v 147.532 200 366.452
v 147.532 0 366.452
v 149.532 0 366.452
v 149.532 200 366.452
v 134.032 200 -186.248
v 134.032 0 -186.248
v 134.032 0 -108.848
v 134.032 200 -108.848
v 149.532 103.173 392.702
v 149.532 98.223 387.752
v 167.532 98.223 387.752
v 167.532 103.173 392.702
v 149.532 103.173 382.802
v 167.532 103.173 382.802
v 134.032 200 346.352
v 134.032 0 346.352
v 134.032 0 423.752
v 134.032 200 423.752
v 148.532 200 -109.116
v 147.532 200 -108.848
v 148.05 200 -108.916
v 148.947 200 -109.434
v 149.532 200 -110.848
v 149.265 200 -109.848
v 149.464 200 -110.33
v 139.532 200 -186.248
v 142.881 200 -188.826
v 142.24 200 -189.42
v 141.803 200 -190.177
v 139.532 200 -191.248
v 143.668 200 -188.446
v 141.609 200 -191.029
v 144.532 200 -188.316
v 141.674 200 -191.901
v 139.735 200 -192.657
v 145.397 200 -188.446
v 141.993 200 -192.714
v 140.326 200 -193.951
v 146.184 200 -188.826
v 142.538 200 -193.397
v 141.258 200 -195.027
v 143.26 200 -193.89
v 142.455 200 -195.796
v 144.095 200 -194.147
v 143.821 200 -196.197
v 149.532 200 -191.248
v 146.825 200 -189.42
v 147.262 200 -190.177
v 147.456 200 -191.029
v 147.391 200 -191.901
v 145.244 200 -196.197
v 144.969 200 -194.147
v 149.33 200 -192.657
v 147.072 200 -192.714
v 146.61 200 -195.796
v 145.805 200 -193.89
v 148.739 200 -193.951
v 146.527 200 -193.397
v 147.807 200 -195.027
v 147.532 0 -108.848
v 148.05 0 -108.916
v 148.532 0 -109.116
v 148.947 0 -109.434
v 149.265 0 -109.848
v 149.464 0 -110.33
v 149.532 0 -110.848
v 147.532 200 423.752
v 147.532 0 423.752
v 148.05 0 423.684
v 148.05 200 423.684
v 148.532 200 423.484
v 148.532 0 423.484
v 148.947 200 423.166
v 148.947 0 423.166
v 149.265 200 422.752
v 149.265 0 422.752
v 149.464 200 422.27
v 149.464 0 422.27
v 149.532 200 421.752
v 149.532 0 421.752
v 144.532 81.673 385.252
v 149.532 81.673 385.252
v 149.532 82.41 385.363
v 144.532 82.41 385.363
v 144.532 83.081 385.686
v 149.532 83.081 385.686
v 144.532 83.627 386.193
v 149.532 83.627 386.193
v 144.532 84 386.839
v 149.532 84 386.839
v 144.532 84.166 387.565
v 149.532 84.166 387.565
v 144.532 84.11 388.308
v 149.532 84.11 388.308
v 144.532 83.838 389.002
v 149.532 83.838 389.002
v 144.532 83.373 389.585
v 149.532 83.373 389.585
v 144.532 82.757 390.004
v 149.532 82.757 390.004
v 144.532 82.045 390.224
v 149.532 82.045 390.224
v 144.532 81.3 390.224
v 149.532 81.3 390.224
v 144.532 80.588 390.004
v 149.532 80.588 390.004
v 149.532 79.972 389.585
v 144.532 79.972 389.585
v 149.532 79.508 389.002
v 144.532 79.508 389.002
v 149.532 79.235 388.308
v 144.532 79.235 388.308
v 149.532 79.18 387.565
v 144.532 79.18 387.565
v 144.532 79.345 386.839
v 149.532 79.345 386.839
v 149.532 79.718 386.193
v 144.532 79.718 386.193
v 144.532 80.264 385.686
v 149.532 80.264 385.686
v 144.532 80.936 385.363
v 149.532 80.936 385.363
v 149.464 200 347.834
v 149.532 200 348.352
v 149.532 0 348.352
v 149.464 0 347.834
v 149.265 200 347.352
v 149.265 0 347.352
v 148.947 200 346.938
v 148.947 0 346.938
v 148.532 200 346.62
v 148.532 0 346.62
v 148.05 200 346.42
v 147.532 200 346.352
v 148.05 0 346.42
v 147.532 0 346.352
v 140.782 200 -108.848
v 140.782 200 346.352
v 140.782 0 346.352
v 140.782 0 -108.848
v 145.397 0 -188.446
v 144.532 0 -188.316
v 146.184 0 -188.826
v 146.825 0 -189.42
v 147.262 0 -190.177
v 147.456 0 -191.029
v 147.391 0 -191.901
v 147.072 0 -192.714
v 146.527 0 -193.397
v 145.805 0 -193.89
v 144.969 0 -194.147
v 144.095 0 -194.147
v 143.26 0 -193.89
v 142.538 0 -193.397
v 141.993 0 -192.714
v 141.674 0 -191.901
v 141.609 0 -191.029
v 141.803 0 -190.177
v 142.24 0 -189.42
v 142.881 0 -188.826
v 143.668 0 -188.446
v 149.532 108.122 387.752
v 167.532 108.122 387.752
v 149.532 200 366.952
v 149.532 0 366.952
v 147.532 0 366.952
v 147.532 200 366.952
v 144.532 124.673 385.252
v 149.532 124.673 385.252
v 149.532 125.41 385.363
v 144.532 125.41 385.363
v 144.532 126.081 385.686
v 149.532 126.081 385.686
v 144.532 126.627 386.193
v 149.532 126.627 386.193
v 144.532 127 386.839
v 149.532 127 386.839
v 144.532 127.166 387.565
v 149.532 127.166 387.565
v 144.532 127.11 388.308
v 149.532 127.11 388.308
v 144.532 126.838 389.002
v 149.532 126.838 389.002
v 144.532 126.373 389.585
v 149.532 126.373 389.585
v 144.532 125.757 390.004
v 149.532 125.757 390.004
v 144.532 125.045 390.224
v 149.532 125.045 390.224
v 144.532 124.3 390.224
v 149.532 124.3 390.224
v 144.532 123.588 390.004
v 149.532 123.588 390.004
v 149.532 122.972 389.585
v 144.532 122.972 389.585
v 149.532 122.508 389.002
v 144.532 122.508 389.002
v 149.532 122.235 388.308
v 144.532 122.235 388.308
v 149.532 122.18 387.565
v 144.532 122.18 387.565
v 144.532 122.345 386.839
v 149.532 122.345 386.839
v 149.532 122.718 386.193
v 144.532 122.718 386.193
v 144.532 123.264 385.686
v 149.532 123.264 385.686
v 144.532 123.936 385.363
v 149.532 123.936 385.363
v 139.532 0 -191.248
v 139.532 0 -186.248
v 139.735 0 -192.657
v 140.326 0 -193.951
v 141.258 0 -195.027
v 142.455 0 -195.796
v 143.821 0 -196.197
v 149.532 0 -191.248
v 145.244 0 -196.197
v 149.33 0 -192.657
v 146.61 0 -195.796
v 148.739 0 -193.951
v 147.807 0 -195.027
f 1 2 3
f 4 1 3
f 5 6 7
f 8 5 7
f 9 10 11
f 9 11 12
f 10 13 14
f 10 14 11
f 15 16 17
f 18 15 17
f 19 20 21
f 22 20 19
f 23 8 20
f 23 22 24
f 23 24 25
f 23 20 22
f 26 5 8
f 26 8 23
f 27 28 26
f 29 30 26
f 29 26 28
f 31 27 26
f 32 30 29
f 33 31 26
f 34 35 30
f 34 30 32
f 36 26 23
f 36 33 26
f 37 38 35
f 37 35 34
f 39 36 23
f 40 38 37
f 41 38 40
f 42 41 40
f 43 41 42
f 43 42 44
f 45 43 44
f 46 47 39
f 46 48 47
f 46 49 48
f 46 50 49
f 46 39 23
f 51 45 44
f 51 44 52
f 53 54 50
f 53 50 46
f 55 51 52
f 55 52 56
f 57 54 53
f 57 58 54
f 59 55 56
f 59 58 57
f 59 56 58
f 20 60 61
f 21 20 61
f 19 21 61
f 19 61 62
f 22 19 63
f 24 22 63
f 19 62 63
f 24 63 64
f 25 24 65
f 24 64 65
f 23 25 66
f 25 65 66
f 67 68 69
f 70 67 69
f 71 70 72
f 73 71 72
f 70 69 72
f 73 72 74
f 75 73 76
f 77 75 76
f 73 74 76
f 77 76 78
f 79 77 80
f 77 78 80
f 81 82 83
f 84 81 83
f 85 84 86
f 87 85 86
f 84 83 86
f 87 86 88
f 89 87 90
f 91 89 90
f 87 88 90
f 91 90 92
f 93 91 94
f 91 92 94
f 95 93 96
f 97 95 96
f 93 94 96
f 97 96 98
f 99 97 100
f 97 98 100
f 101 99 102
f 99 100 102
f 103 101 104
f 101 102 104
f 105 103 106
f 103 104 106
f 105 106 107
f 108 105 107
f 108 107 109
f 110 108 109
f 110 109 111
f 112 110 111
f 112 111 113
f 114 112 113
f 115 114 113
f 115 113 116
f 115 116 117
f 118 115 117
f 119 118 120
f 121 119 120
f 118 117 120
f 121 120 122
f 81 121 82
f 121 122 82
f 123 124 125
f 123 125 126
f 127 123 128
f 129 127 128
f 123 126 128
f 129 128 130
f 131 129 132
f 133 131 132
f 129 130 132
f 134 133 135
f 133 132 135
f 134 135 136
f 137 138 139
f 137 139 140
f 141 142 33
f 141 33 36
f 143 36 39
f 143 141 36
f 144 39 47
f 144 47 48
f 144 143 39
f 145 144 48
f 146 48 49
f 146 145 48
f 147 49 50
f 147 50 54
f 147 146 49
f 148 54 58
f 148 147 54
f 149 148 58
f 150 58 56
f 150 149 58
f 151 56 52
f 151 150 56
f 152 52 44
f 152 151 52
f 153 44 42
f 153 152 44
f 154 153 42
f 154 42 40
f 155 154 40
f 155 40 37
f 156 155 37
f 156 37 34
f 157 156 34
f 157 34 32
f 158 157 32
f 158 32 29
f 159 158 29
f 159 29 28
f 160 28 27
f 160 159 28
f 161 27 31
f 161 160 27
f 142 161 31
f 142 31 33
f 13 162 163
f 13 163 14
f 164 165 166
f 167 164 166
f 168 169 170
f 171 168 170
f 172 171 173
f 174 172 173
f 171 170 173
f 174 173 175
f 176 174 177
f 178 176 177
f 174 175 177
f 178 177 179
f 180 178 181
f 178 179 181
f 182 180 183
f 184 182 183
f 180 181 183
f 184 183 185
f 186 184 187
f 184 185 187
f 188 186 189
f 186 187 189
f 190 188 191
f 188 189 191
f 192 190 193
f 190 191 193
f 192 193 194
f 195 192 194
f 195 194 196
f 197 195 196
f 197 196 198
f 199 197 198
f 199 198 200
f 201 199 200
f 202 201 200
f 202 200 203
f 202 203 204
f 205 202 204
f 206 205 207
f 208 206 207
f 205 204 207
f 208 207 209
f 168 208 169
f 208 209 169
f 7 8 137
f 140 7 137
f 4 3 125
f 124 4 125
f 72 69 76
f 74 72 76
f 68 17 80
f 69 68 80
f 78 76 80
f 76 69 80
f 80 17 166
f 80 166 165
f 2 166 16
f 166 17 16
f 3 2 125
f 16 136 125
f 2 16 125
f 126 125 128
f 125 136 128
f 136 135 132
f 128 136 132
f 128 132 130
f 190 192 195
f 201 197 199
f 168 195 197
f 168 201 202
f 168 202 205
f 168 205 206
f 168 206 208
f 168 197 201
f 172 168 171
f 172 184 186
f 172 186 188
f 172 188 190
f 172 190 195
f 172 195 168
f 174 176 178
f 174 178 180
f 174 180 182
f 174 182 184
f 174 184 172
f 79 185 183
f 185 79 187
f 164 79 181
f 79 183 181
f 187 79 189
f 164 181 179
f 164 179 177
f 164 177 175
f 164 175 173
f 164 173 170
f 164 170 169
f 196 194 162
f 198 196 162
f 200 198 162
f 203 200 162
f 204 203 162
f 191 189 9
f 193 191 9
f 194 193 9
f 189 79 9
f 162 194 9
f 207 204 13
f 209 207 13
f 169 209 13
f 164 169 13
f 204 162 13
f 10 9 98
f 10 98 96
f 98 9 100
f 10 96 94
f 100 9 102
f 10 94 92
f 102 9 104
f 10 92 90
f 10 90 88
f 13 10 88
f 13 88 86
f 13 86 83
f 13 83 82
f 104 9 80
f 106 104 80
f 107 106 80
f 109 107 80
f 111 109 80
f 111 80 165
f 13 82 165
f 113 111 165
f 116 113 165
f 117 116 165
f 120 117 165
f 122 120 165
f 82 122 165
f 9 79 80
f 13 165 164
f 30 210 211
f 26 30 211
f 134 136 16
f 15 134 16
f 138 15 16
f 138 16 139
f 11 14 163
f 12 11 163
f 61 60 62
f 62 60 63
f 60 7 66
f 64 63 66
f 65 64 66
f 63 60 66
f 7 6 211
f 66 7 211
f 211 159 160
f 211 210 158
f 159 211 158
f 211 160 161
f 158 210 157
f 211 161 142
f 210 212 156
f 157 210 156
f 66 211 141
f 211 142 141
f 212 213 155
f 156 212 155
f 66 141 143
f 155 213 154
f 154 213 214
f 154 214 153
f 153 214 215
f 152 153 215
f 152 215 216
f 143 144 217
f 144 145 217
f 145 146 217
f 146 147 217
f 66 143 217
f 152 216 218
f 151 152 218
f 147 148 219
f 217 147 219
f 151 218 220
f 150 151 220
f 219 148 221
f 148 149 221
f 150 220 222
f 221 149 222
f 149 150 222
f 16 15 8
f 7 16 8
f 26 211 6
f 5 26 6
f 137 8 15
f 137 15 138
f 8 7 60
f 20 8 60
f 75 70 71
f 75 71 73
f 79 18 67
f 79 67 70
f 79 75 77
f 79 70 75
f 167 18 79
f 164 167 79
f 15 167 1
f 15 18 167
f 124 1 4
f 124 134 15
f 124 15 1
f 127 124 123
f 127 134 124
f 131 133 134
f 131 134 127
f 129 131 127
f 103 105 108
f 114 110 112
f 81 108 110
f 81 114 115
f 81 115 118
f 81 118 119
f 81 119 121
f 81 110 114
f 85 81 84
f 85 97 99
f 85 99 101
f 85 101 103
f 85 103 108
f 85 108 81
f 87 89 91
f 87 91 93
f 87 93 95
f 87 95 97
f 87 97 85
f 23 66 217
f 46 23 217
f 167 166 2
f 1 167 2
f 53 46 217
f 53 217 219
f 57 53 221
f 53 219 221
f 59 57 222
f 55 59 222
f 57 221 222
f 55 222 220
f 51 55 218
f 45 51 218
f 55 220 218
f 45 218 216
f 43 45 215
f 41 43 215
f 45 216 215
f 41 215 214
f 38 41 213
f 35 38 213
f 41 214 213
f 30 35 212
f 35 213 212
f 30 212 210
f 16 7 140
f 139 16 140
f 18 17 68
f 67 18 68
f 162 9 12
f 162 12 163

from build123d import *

# Parameters (mm, degrees)
SKETCH_1_R          = 2.931940553
EXTRUDE_1_DEPTH     = 200
EXTRUDE_1_2_DEPTH   = 200
SKETCH_2_W          = 6.75
SKETCH_2_H          = 455.2
EXTRUDE_2_DEPTH     = 200
EXTRUDE_3_DEPTH     = 18
SKETCH_3_3_R        = 2.5
CUT_EXTRUDE_1_DEPTH = 5


with BuildPart() as part:
    # Эскиз1 → Бобышка-Вытянуть1 (new body)
    with BuildSketch(Plane(origin=(0, 0, 0), x_dir=(1, 0, 0), z_dir=(0, 1, 0))):
        with BuildLine():
            Line((134.032480032, 108.848097027), (147.532480032, 108.848097027))
            ThreePointArc((147.532480032, 108.848097027), (148.946693595, 109.433883464), (149.532480032, 110.848097027))
            Line((149.532480032, 110.848097027), (149.532480032, 184.248097027))
            Line((149.532480032, 184.248097027), (149.532480032, 191.248097027))
            ThreePointArc((149.532480032, 191.248097027), (144.532480032, 196.248097027), (139.532480032, 191.248097027))
            Line((139.532480032, 191.248097027), (139.532480032, 186.248097027))
            Line((139.532480032, 186.248097027), (134.032480032, 186.248097027))
            Line((134.032480032, 186.248097027), (134.032480032, 108.848097027))
        make_face()
        with Locations((144.532480032, 191.248097027)):
            Circle(SKETCH_1_R, mode=Mode.SUBTRACT)
    extrude(amount=EXTRUDE_1_DEPTH)


with BuildPart() as body_2:
    # Эскиз1 → Extrude 1 2 (new body)
    with BuildSketch(Plane(origin=(0, 0, 0), x_dir=(1, 0, 0), z_dir=(0, 1, 0))):
        with BuildLine():
            Line((134.032480032, -423.751902973), (147.532480032, -423.751902973))
            ThreePointArc((147.532480032, -423.751902973), (148.946693595, -423.166116536), (149.532480032, -421.751902973))
            Line((149.532480032, -421.751902973), (149.532480032, -366.951902973))
            Line((149.532480032, -366.951902973), (147.532480032, -366.951902973))
            Line((147.532480032, -366.951902973), (147.532480032, -366.451902973))
            Line((147.532480032, -366.451902973), (149.532480032, -366.451902973))
            Line((149.532480032, -366.451902973), (149.532480032, -348.351902973))
            ThreePointArc((149.532480032, -348.351902973), (148.946693595, -346.937689411), (147.532480032, -346.351902973))
            Line((147.532480032, -346.351902973), (134.032480032, -346.351902973))
            Line((134.032480032, -346.351902973), (134.032480032, -423.751902973))
        make_face()
    extrude(amount=EXTRUDE_1_2_DEPTH)

    # Эскиз3 → Бобышка-Вытянуть3 (add)
    with BuildSketch(Plane(origin=(149.532480032, 0, 0), x_dir=(0, 0, -1), z_dir=(1, 0, 0))):
        Polygon((-387.751902973, 108.122367155), (-392.701650442, 103.172619686), (-387.751902973, 98.222872218), (-382.802155505, 103.172619686), align=None)
    extrude(amount=EXTRUDE_3_DEPTH)

    # Эскиз3<3> → Вырез-Вытянуть1 (cut)
    with BuildSketch(Plane(origin=(149.532480032, 0, 0), x_dir=(0, 0, -1), z_dir=(1, 0, 0))):
        with Locations((-387.751902973, 124.672619686)):
            Circle(SKETCH_3_3_R)
        with Locations((-387.751902973, 81.672619686)):
            Circle(SKETCH_3_3_R)
    extrude(amount=-CUT_EXTRUDE_1_DEPTH, mode=Mode.SUBTRACT)


with BuildPart() as body_3:
    # Эскиз2 → Бобышка-Вытянуть2 (new body)
    with BuildSketch(Plane(origin=(0, 200, 0), x_dir=(1, 0, 0), z_dir=(0, 1, 0))):
        with Locations((137.407480032, -118.751902973)):
            Rectangle(SKETCH_2_W, SKETCH_2_H)
    extrude(amount=-EXTRUDE_2_DEPTH)


solid = Compound([part.part, body_2.part, body_3.part])
